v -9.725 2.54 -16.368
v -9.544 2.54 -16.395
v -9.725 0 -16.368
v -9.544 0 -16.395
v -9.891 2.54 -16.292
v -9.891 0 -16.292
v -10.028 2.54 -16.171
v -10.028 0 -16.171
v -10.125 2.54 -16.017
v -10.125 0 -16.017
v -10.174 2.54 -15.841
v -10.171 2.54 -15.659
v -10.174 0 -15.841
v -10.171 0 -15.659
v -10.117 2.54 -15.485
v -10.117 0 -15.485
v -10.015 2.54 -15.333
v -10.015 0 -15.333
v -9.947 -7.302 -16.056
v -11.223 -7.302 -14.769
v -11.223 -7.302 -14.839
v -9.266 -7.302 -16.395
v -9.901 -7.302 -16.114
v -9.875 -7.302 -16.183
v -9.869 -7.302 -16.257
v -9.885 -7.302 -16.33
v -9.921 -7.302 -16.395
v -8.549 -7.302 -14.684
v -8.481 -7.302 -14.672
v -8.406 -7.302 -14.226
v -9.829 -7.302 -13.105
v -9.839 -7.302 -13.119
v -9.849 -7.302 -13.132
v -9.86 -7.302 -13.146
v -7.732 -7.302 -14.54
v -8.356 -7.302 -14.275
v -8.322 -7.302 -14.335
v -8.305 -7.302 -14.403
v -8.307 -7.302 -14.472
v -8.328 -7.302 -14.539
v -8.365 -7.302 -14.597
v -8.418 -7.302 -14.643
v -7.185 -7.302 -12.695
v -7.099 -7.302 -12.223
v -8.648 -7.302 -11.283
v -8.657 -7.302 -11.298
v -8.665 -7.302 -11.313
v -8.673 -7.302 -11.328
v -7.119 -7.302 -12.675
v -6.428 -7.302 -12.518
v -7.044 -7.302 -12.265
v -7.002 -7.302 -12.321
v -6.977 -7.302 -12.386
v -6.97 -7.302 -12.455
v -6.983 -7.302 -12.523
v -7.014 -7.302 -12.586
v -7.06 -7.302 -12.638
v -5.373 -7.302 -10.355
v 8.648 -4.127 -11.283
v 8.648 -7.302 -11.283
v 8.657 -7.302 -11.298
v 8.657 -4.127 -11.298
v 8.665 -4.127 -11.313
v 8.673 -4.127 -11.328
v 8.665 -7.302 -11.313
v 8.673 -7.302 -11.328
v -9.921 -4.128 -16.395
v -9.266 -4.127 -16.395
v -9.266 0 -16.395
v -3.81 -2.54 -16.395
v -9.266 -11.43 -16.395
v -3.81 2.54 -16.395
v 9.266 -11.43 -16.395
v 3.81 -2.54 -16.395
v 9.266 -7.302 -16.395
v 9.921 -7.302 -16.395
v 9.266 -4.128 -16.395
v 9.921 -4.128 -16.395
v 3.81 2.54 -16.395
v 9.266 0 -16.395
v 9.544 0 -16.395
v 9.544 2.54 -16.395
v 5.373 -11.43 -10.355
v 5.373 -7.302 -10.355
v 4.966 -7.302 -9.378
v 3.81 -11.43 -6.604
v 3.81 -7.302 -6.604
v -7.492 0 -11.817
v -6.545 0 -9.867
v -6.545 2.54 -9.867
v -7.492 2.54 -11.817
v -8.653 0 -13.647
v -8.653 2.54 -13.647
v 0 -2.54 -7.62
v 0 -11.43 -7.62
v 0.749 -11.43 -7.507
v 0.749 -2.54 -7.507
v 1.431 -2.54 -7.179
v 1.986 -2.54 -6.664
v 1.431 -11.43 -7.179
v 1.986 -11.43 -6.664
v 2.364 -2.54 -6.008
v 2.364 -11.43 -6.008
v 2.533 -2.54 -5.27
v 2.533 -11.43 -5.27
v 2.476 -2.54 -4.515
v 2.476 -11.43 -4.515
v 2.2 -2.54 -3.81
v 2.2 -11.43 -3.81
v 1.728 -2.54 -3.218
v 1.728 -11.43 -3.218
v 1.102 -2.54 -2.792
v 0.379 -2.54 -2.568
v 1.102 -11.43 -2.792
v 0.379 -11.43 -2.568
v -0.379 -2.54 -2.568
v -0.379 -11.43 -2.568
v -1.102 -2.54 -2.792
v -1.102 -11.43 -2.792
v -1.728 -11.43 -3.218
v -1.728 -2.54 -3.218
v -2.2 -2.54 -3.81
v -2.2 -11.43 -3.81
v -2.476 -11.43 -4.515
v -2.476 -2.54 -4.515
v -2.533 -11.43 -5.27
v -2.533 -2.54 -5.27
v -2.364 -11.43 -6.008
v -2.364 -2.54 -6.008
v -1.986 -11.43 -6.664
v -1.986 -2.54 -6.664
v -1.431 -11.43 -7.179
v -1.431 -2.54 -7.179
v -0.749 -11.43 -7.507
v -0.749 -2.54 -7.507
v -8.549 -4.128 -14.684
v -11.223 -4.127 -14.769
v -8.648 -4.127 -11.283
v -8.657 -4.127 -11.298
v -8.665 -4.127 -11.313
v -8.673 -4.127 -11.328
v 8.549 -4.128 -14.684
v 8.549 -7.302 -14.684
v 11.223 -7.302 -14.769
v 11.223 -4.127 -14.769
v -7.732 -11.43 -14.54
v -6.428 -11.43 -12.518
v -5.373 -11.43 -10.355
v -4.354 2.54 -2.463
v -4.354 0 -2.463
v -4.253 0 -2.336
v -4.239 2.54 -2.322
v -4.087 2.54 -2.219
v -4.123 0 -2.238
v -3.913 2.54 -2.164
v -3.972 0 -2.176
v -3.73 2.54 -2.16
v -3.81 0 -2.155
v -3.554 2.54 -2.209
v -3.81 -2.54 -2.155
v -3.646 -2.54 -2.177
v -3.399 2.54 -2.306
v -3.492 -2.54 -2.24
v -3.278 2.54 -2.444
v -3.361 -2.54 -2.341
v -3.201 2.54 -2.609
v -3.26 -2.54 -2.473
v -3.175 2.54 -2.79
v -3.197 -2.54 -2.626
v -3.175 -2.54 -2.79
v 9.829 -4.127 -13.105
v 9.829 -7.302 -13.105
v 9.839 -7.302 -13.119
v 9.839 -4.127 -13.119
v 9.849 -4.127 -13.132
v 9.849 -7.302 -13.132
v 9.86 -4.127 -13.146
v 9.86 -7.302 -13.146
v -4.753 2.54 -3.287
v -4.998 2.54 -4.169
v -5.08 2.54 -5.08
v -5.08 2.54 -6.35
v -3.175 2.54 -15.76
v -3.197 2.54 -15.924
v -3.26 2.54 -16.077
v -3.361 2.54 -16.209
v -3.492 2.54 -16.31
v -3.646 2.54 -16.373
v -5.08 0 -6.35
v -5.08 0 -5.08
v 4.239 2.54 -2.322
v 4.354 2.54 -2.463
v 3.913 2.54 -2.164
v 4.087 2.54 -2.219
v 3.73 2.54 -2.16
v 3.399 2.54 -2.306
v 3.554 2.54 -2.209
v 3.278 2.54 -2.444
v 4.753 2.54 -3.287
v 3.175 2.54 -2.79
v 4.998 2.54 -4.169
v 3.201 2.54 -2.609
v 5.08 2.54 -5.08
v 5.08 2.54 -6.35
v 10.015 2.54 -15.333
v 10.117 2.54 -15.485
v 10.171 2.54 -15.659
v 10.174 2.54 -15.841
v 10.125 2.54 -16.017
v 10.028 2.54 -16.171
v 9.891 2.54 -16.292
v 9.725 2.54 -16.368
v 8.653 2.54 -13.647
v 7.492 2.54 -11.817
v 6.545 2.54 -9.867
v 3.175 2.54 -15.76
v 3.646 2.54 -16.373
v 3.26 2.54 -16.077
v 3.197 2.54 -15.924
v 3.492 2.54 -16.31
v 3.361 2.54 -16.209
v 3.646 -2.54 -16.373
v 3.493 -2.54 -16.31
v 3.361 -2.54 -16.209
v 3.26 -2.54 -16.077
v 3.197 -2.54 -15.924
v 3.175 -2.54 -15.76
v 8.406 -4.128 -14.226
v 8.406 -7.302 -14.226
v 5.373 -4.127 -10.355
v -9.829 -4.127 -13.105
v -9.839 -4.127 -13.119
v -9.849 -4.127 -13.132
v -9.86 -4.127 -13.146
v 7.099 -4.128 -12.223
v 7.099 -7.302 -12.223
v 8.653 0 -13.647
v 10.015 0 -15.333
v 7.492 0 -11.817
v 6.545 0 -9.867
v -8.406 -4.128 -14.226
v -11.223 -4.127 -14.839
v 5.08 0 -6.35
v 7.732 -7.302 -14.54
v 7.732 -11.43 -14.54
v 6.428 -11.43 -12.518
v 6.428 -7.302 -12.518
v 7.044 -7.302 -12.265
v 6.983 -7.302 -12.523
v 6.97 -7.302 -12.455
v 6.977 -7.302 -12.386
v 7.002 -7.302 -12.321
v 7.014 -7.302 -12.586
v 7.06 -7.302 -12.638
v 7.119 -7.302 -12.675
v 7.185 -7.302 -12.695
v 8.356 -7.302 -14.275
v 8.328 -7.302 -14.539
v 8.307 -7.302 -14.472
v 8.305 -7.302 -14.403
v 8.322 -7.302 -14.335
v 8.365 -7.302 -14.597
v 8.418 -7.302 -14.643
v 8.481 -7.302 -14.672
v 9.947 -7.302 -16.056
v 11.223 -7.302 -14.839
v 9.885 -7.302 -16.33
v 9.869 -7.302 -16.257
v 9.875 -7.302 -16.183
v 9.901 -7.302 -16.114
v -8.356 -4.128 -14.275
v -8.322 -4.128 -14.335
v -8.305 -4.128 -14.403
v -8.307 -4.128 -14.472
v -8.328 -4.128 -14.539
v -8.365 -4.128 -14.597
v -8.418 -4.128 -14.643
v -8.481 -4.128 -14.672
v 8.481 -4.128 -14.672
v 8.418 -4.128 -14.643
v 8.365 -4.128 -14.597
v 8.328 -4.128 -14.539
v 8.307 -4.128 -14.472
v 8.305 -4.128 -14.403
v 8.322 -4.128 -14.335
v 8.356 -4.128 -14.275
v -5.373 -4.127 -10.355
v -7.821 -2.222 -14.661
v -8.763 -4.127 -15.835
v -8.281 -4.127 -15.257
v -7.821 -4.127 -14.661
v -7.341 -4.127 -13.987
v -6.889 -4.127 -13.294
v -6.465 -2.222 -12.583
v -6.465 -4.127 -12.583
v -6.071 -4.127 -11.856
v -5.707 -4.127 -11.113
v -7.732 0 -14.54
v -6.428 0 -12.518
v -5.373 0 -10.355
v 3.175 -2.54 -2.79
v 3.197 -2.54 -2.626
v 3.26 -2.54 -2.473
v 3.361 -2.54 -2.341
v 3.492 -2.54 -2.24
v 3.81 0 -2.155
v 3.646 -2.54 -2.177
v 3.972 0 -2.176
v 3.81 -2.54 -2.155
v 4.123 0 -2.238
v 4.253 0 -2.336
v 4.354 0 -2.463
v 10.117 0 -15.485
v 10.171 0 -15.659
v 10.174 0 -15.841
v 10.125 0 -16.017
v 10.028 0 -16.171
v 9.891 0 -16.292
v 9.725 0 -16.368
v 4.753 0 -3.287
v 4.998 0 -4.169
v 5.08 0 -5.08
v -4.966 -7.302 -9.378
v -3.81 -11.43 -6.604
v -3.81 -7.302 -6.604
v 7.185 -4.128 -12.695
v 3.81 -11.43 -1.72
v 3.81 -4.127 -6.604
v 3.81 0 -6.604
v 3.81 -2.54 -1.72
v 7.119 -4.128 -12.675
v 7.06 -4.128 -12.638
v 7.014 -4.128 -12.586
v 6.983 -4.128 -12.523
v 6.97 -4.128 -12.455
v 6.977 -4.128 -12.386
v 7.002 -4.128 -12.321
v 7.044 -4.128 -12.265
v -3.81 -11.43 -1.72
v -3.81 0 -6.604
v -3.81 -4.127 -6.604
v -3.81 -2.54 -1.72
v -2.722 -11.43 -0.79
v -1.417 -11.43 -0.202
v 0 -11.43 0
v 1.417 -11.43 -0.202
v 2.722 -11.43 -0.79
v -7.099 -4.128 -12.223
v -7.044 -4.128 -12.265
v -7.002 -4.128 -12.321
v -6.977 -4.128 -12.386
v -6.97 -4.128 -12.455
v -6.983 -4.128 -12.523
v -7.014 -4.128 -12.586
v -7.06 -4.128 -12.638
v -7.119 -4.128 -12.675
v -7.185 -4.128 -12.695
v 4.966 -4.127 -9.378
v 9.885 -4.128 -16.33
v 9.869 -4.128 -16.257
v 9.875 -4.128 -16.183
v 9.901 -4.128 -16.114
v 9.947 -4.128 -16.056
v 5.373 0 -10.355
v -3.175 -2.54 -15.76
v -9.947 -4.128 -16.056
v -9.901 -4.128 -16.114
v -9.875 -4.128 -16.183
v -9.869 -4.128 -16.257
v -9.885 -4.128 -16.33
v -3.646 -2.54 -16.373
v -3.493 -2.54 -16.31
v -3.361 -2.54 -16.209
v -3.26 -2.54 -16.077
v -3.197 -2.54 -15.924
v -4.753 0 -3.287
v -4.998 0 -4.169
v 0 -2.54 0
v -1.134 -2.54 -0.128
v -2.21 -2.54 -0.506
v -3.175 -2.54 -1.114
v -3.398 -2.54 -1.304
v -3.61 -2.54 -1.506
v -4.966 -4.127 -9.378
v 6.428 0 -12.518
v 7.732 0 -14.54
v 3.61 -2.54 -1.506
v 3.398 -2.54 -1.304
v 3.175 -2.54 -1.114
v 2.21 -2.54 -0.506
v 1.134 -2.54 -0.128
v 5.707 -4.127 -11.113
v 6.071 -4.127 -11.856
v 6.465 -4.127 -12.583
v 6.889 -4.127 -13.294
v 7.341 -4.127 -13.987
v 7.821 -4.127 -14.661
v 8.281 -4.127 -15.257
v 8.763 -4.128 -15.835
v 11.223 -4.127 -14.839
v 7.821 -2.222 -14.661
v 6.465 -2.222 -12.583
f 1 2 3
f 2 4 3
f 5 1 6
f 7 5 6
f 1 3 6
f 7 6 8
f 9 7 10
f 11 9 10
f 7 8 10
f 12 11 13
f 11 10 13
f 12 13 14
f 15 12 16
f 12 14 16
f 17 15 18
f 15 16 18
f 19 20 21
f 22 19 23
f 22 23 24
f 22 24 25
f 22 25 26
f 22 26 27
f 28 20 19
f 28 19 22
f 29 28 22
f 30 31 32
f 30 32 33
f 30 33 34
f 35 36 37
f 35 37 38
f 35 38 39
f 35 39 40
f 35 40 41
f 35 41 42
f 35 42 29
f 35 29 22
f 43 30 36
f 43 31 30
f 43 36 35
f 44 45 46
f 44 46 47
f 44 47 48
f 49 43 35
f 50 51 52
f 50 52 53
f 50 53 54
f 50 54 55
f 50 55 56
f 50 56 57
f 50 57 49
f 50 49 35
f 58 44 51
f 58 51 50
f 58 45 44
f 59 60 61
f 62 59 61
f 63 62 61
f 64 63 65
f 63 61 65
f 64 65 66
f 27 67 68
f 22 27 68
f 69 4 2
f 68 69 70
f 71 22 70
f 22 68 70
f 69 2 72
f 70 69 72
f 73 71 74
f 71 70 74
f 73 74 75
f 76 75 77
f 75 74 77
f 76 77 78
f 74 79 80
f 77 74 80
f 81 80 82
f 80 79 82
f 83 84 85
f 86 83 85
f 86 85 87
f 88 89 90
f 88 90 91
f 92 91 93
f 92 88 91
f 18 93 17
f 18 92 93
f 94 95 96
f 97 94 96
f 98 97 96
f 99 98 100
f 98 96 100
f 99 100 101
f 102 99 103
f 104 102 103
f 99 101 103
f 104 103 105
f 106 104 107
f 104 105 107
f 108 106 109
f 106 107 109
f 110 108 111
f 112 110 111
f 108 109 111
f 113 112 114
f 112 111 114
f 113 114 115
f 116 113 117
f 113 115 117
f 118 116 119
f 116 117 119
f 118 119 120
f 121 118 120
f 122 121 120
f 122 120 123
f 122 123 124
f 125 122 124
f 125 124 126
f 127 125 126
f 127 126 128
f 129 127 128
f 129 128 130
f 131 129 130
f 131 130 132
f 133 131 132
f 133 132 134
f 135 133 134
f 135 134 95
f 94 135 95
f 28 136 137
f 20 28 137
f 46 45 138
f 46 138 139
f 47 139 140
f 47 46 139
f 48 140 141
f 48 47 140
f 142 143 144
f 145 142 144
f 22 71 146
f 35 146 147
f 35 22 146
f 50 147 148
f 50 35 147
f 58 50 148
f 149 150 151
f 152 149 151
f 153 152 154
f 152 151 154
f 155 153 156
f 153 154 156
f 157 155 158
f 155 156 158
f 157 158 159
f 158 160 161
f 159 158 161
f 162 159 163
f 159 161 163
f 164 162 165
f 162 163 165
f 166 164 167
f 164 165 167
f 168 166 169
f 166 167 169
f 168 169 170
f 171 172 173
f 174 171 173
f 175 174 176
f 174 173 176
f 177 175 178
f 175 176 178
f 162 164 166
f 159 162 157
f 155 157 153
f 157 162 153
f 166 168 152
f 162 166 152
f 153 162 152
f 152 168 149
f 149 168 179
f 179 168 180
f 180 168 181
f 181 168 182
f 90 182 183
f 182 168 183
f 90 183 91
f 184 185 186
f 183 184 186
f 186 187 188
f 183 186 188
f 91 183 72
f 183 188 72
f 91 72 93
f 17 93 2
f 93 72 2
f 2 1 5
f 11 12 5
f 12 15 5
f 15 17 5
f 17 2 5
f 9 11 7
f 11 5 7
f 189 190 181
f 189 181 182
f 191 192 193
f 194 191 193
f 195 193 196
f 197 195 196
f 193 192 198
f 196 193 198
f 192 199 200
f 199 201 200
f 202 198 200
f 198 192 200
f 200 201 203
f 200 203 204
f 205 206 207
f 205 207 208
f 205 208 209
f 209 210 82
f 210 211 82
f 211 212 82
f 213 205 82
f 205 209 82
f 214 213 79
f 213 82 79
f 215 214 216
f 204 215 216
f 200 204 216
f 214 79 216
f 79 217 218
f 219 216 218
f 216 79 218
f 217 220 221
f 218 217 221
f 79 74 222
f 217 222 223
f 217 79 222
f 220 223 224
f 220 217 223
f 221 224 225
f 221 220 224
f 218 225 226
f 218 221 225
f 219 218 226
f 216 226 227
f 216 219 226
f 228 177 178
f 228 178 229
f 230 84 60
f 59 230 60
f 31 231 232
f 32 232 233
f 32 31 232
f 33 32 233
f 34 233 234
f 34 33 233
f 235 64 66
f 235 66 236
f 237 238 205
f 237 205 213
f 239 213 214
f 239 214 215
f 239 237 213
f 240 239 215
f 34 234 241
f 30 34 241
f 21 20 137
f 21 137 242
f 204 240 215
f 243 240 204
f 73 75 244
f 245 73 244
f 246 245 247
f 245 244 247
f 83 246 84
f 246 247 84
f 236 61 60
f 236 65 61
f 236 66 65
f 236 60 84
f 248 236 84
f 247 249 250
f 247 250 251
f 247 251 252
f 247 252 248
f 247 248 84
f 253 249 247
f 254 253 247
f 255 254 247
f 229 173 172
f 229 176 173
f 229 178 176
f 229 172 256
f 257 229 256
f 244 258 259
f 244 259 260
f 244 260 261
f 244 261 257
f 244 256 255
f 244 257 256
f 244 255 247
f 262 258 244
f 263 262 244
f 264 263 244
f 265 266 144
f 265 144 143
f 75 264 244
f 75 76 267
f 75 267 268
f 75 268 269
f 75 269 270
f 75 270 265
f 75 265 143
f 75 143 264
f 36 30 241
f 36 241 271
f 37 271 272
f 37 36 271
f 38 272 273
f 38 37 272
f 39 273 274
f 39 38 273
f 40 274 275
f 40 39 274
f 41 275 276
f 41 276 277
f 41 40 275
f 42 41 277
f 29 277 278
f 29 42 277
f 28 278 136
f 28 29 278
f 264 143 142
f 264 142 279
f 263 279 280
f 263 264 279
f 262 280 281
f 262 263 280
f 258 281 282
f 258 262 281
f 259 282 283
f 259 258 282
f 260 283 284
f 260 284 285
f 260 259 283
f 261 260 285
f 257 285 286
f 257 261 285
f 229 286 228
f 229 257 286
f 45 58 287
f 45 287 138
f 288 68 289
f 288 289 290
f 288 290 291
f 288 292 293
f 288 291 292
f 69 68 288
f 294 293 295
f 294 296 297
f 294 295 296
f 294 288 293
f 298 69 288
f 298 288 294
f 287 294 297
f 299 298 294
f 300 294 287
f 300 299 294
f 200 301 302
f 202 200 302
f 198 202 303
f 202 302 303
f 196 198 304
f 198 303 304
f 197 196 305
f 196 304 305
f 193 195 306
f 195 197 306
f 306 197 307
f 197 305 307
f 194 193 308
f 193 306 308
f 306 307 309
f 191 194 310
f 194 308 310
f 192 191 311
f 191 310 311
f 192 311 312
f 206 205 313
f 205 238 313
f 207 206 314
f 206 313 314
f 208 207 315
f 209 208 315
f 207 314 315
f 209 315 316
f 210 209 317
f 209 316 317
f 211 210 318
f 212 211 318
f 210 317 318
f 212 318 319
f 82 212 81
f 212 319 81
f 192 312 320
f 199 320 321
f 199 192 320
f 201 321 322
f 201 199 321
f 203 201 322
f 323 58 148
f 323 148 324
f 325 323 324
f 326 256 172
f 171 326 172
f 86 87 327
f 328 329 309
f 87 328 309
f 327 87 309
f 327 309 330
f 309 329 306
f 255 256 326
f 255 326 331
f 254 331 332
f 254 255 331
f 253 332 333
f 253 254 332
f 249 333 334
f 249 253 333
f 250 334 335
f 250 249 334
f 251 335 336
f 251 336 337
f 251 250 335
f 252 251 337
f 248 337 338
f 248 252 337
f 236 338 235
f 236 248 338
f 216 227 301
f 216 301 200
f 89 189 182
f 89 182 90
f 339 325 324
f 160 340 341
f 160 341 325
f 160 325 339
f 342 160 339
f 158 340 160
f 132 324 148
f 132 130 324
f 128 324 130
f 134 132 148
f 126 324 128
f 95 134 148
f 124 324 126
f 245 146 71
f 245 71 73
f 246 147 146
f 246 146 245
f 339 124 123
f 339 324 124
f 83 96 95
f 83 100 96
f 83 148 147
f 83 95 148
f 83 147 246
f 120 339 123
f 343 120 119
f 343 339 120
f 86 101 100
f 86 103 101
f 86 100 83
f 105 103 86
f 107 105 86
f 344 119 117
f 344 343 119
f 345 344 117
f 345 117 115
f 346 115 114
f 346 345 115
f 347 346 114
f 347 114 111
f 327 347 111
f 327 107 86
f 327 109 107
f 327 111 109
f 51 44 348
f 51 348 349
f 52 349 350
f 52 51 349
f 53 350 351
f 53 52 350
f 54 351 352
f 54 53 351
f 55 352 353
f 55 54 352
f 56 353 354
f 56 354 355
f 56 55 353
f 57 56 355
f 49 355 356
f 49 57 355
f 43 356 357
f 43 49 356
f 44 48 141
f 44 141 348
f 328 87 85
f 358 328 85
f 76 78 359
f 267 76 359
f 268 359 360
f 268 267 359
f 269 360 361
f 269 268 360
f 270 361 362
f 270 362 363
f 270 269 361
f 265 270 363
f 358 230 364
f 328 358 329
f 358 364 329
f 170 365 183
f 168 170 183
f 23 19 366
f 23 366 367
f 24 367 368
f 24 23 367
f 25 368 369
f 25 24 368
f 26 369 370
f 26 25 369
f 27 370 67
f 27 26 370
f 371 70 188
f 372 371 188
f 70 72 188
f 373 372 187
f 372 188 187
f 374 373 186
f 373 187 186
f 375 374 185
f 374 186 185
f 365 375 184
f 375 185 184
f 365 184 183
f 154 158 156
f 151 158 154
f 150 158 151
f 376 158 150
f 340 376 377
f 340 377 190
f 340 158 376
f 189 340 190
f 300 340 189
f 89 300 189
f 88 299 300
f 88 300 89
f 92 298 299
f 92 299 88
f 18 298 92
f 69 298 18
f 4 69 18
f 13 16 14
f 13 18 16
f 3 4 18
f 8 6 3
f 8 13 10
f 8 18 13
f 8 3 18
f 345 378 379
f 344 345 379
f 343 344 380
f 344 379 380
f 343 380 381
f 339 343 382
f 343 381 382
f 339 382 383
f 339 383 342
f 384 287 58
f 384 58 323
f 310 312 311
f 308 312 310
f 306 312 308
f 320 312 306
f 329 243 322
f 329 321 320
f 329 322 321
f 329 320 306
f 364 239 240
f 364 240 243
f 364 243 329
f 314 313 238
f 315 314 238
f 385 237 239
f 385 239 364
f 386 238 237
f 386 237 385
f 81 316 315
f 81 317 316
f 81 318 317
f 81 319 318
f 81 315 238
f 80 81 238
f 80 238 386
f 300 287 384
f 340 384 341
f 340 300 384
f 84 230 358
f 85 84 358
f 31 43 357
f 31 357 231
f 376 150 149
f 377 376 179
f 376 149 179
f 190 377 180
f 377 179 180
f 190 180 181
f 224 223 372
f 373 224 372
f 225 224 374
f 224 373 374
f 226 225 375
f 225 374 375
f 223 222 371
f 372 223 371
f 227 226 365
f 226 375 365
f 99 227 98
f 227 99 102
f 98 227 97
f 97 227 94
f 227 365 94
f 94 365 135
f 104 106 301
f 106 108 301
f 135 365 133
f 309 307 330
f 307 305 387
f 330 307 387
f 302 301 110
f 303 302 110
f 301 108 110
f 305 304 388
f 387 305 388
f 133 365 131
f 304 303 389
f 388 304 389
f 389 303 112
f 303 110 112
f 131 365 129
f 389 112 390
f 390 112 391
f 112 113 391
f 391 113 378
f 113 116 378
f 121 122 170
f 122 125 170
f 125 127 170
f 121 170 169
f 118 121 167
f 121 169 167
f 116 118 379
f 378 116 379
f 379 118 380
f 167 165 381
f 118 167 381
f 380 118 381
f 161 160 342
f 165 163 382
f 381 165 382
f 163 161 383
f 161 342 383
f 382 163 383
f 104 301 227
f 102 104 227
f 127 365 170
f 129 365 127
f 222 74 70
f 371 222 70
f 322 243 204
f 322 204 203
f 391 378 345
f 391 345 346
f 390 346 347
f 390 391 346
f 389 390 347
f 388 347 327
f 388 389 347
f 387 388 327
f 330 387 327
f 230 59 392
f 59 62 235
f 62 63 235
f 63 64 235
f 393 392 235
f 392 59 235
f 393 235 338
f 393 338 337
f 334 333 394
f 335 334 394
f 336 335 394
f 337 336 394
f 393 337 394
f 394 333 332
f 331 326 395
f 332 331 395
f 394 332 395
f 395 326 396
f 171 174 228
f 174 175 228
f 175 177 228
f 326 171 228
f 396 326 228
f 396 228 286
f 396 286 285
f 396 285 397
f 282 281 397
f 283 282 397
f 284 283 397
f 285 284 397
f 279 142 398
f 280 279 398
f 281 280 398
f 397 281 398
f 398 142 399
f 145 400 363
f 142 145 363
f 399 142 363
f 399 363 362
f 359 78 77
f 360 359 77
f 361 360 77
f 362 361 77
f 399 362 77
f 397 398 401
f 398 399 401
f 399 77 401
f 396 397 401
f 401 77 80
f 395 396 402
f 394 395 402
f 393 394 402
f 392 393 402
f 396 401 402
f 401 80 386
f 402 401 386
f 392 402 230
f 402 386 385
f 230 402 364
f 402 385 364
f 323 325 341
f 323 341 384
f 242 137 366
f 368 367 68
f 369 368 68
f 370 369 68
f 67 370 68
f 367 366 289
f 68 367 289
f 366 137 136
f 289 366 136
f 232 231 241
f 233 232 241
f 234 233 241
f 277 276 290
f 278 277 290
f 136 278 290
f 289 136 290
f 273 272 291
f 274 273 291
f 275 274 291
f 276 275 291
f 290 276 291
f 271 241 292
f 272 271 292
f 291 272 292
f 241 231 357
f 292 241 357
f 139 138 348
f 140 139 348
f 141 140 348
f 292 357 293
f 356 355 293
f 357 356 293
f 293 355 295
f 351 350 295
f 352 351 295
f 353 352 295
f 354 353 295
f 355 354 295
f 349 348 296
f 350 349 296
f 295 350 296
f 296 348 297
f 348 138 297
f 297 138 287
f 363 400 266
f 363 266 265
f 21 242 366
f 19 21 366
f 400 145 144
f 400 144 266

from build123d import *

# Parameters (mm, degrees)
BOSS_EXTRUDE1_DEPTH  = 2.54
BOSS_EXTRUDE2_DEPTH  = 11.43
BOSS_EXTRUDE3_DEPTH  = 1.5875
CUT_EXTRUDE1_DEPTH   = 5.08
CUT_EXTRUDE2_DEPTH   = 5.08
CIRPATTERN1_COUNT    = 10
CIRPATTERN1_ANGLE    = 63
FILLET1_R            = 0.254
MIRROR1_COPY_1_DEPTH = 5.08
MIRROR1_COPY_2_DEPTH = 5.08
MIRROR1_COPY_3_DEPTH = 5.08
MIRROR1_COPY_4_DEPTH = 5.08
MIRROR1_COPY_5_DEPTH = 5.08
MIRROR1_COPY_6_DEPTH = 5.08
MIRROR1_COPY_7_DEPTH = 5.08
MIRROR1_COPY_8_DEPTH = 5.08
MIRROR1_COPY_9_DEPTH = 5.08
FILLET1_OF_MIRROR1_R = 0.254
FILLET3_R            = 5.08
SKETCH8_R            = 2.54
CUT_EXTRUDE3_DEPTH   = 37.969969278
SKETCH9_W            = 6.35
SKETCH9_H            = 5.08
CUT_EXTRUDE4_DEPTH   = 37.086876125
FILLET5_R            = 1.27
FILLET6_R            = 0.635
SKETCH10_W           = 12.288229788
SKETCH10_H           = 22.793910423
CUT_EXTRUDE5_DEPTH   = 37.969969278
SKETCH11_W           = 22.446987528
SKETCH11_H           = 9.005342915
CUT_EXTRUDE6_DEPTH   = 32.085168686
FILLET7_R            = 0.635


# Some blends are built 0.0001 mm under size
with BuildPart() as part:
    # Sketch1 → Boss-Extrude1 (new body)
    with BuildSketch(Plane(origin=(0, 0, 0), x_dir=(1, 0, 0), z_dir=(0, 1, 0))):
        with BuildLine():
            Line((-22.86, 25.4), (22.86, 25.4))
            Line((22.86, 25.4), (22.86, 21.547619525))
            ThreePointArc((22.86, 21.547619525), (13.040193974, 18.029309291), (6.545384615, 9.866923077))
            Line((6.545384615, 9.866923077), (5.08, 6.35))
            Line((5.08, 6.35), (5.08, 0))
            Line((5.08, 0), (-5.08, 0))
            Line((-5.08, 0), (-5.08, 6.35))
            Line((-5.08, 6.35), (-6.545384615, 9.866923077))
            ThreePointArc((-6.545384615, 9.866923077), (-13.040193974, 18.029309291), (-22.86, 21.547619525))
            Line((-22.86, 21.547619525), (-22.86, 25.4))
        make_face()
    extrude(amount=BOSS_EXTRUDE1_DEPTH)

    # Sketch3 → Boss-Extrude2 (add)
    with BuildSketch(Plane.XZ):
        with BuildLine():
            Line((-3.81, 0), (0, 0))
            Line((0, 0), (0, -25.4))
            Line((0, -25.4), (-21.59, -25.4))
            Line((-21.59, -25.4), (-22.86, -25.4))
            Line((-22.86, -25.4), (-22.86, -22.70062499))
            Line((-22.86, -22.70062499), (-21.59, -22.70062499))
            ThreePointArc((-21.59, -22.70062499), (-11.821833073, -18.70822275), (-5.373076923, -10.355384615))
            Line((-5.373076923, -10.355384615), (-3.81, -6.604))
            Line((-3.81, -6.604), (-3.81, 0))
        make_face()
    boss_extrude2 = extrude(amount=BOSS_EXTRUDE2_DEPTH)

    # Sketch4 → Boss-Extrude3 (add, symmetric)
    with BuildSketch(Plane(origin=(0, -5.715, 0), x_dir=(-1, 0, 0), z_dir=(0, -1, 0))):
        with BuildLine():
            Line((22.944666667, 20.28044489), (22.944666667, 25.4))
            Line((22.944666667, 25.4), (0, 25.4))
            Line((0, 25.4), (0, 0))
            Line((0, 0), (3.81, 0))
            Line((3.81, 0), (3.81, 6.604))
            Line((3.81, 6.604), (4.966025641, 9.378461538))
            Line((4.966025641, 9.378461538), (7.717692308, 9.378461538))
            ThreePointArc((7.717692308, 9.378461538), (13.779514375, 16.996688671), (22.944666667, 20.28044489))
        make_face()
    boss_extrude3 = extrude(amount=BOSS_EXTRUDE3_DEPTH, both=True)

    # Sketch6 → Cut-Extrude1 (cut)
    with BuildSketch(Plane.XZ.offset(7.3025)):
        Polygon((-7.717692308, -9.378461538), (-5.373076923, -10.355384615), (-8.648388962, -11.283461538), align=None)
    cut_extrude1 = extrude(amount=-CUT_EXTRUDE1_DEPTH, mode=Mode.SUBTRACT)

    # Sketch7 → Cut-Extrude2 (cut)
    with BuildSketch(Plane.XZ.offset(7.3025)):
        Polygon((-7.717692308, -9.378461538), (-5.373076923, -10.355384615), (-4.966025641, -9.378461538), align=None)
    cut_extrude2 = extrude(amount=-CUT_EXTRUDE2_DEPTH, mode=Mode.SUBTRACT)

    # CirPattern1: Cut-Extrude1 ×10 about axis
    cirpattern1_axis = Axis((-24.13, 0, -2.54), (0, 1, 0))
    for i in range(1, CIRPATTERN1_COUNT):
        add(cut_extrude1.rotate(cirpattern1_axis, i * CIRPATTERN1_ANGLE / (CIRPATTERN1_COUNT - 1)), mode=Mode.SUBTRACT)

    # Fillet1
    # the kernel refuses this fillet: 0.254 mm, written as the material it adds along each edge
    with BuildSketch(Plane(origin=(-22.5780938, -7.3025, -22.800651202), x_dir=(-0.07637333661020333, 0, 0.9970792914583196), z_dir=(0, 1, 0))) as fillet1_piece_1_section:
        with BuildLine():
            CenterArc((0.663062221, -0.254), FILLET1_R, 90, 108.665400871)
            Line((0.422421678, -0.335290399), (0.417608867, -0.336916207))
            ThreePointArc((0.417608867, -0.336916207), (0.208052614, -0.171624146), (-0.003158225, -0.003978947))
            Line((-0.003158225, -0.003978947), (0, 0.00508))
            Line((0, 0.00508), (0.663062221, 0.00508))
            Line((0.663062221, 0.00508), (0.663062221, 0))
        make_face()
    fillet1_piece_1 = extrude(amount=5.08, mode=Mode.PRIVATE)
    fillet1_piece_1 = split(fillet1_piece_1, bisect_by=Plane(origin=(-22.705091863, -5.715, -22.70062499), z_dir=(0, 0, 1)), keep=Keep.TOP, mode=Mode.PRIVATE)
    fillet1_piece_1 = split(fillet1_piece_1, bisect_by=Plane(origin=(-22.705091863, -4.1275, -22.489092759), z_dir=(0, -1, 0)), keep=Keep.TOP, mode=Mode.PRIVATE)
    fillet1_piece_1 = split(fillet1_piece_1, bisect_by=Plane(origin=(-22.944666667, -5.715, -22.489092759), z_dir=(1, 0, 0)), keep=Keep.TOP, mode=Mode.PRIVATE)
    add(fillet1_piece_1)
    with BuildSketch(Plane(origin=(-22.5780938, -8.960155552, -22.800651202), x_dir=(-0.07637333661019842, 0, 0.99707929145832), z_dir=(0, 1, 0))) as fillet1_piece_2_section:
        with BuildLine():
            CenterArc((0.663062221, -0.254), FILLET1_R, 90, 108.665400871)
            Line((0.422421678, -0.335290399), (0.417608867, -0.336916207))
            ThreePointArc((0.417608867, -0.336916207), (0.208052614, -0.171624146), (-0.003158225, -0.003978947))
            Line((-0.003158225, -0.003978947), (0, 0.00508))
            Line((0, 0.00508), (0.663062221, 0.00508))
            Line((0.663062221, 0.00508), (0.663062221, 0))
        make_face()
    fillet1_piece_2 = extrude(amount=6.737655552, mode=Mode.PRIVATE)
    fillet1_piece_2 = split(fillet1_piece_2, bisect_by=Plane(origin=(-22.610568063, -8.131327776, -22.70062499), z_dir=(0, 0, -1)), keep=Keep.TOP, mode=Mode.PRIVATE)
    fillet1_piece_2 = split(fillet1_piece_2, bisect_by=Plane(origin=(-22.610568063, -7.3025, -22.737867725), z_dir=(0, -1, 0)), keep=Keep.TOP, mode=Mode.PRIVATE)
    add(fillet1_piece_2)
    with BuildSketch(Plane(origin=(-22.5780938, -7.3025, -22.800651202), x_dir=(-0.07637333661020333, 0, 0.9970792914583196), z_dir=(0, 1, 0))) as fillet1_piece_3_section:
        with BuildLine():
            CenterArc((0.663062221, -0.254), FILLET1_R, 90, 108.665400871)
            Line((0.422421678, -0.335290399), (0.417608867, -0.336916207))
            ThreePointArc((0.417608867, -0.336916207), (0.208052614, -0.171624146), (-0.003158225, -0.003978947))
            Line((-0.003158225, -0.003978947), (0, 0.00508))
            Line((0, 0.00508), (0.663062221, 0.00508))
            Line((0.663062221, 0.00508), (0.663062221, 0))
        make_face()
    fillet1_piece_3 = extrude(amount=5.08, mode=Mode.PRIVATE)
    fillet1_piece_3 = split(fillet1_piece_3, bisect_by=Plane(origin=(-22.610568063, -5.715, -22.70062499), z_dir=(0, 0, -1)), keep=Keep.TOP, mode=Mode.PRIVATE)
    fillet1_piece_3 = split(fillet1_piece_3, bisect_by=Plane(origin=(-22.610568063, -4.1275, -22.737867725), z_dir=(0, -1, 0)), keep=Keep.TOP, mode=Mode.PRIVATE)
    add(fillet1_piece_3)
    with BuildSketch(Plane(origin=(-22.5780938, -7.3025, -22.800651202), x_dir=(-0.07637333661020333, 0, 0.9970792914583196), z_dir=(0, 1, 0))) as fillet1_piece_4_section:
        with BuildLine():
            CenterArc((0.663062221, -0.254), FILLET1_R, 90, 108.665400871)
            Line((0.422421678, -0.335290399), (0.417608867, -0.336916207))
            ThreePointArc((0.417608867, -0.336916207), (0.208052614, -0.171624146), (-0.003158225, -0.003978947))
            Line((-0.003158225, -0.003978947), (0, 0.00508))
            Line((0, 0.00508), (0.663062221, 0.00508))
            Line((0.663062221, 0.00508), (0.663062221, 0))
        make_face()
    fillet1_piece_4 = extrude(amount=5.08, mode=Mode.PRIVATE)
    fillet1_piece_4 = split(fillet1_piece_4, bisect_by=Plane(origin=(-22.610568063, -3.175, -22.70062499), z_dir=(0, 0, -1)), keep=Keep.TOP, mode=Mode.PRIVATE)
    fillet1_piece_4 = split(fillet1_piece_4, bisect_by=Plane(origin=(-22.610568063, -4.1275, -22.737867725), z_dir=(0, 1, 0)), keep=Keep.TOP, mode=Mode.PRIVATE)
    add(fillet1_piece_4)
    with BuildSketch(Plane(origin=(-22.5780938, -7.3025, -22.800651202), x_dir=(-0.07637333661020333, 0, 0.9970792914583196), z_dir=(0, 1, 0))) as fillet1_piece_5_section:
        with BuildLine():
            CenterArc((0.663062221, -0.254), FILLET1_R, 90, 108.665400871)
            Line((0.422421678, -0.335290399), (0.417608867, -0.336916207))
            ThreePointArc((0.417608867, -0.336916207), (0.208052614, -0.171624146), (-0.003158225, -0.003978947))
            Line((-0.003158225, -0.003978947), (0, 0.00508))
            Line((0, 0.00508), (0.663062221, 0.00508))
            Line((0.663062221, 0.00508), (0.663062221, 0))
        make_face()
    fillet1_piece_5 = extrude(amount=6.737655552, mode=Mode.PRIVATE)
    fillet1_piece_5 = split(fillet1_piece_5, bisect_by=Plane(origin=(-22.610568063, -1.393672224, -22.70062499), z_dir=(0, 0, -1)), keep=Keep.TOP, mode=Mode.PRIVATE)
    fillet1_piece_5 = split(fillet1_piece_5, bisect_by=Plane(origin=(-22.610568063, -2.2225, -22.737867725), z_dir=(0, 1, 0)), keep=Keep.TOP, mode=Mode.PRIVATE)
    add(fillet1_piece_5)
    with BuildSketch(Plane(origin=(-20.120509215, -7.3025, -22.460501591), x_dir=(-0.7640253133482992, 0, 0.6451862681141263), z_dir=(0, 1, 0)), Plane(origin=(-17.722696902, -7.3025, -21.823383184), x_dir=(-0.836958811389497, 0, 0.5472658842258308), z_dir=(0, 1, 0)), Plane(origin=(-15.42040272, -7.3025, -20.898793948), x_dir=(-0.8974151813055786, 0, 0.4411870265117453), z_dir=(0, 1, 0)), Plane(origin=(-13.247948573, -7.3025, -19.70051738), x_dir=(-0.9444931578692072, 0, 0.3285310864107881), z_dir=(0, 1, 0))) as fillet1_piece_6:
        with BuildLine():
            CenterArc((FILLET1_R * 2.86836666105, FILLET1_R), FILLET1_R, 128.440222299, 141.559777701)
            Line((FILLET1_R * 2.24666887201, FILLET1_R * 1.78325721133), (FILLET1_R * 2.23423491622, FILLET1_R * 1.79892235556))
            Line((FILLET1_R * 2.23423491622, FILLET1_R * 1.79892235556), (-FILLET1_R * 0.0124339557808, FILLET1_R * 0.0156651442266))
            Line((-FILLET1_R * 0.0124339557808, FILLET1_R * 0.0156651442266), (0, -FILLET1_R * 0.02))
            Line((0, -FILLET1_R * 0.02), (FILLET1_R * 2.86836666105, -FILLET1_R * 0.02))
            Line((FILLET1_R * 2.86836666105, -FILLET1_R * 0.02), (FILLET1_R * 2.86836666105, 0))
        make_face()
    extrude(amount=3.175)
    with BuildSketch(Plane(origin=(-11.237720749, -7.3025, -18.246417023), x_dir=(-0.6344625615675041, 0, 0.772953593671186), z_dir=(0, 1, 0)), Plane(origin=(-9.419687114, -7.3025, -16.558170165), x_dir=(-0.723932720787678, 0, 0.6898705790022863), z_dir=(0, 1, 0)), Plane(origin=(-7.820950361, -7.3025, -14.660944678), x_dir=(-0.8026107105625789, 0, 0.5965031829673938), z_dir=(0, 1, 0)), Plane(origin=(-6.465343975, -7.3025, -12.583023823), x_dir=(-0.8693236232823137, 0, 0.49424329838988196), z_dir=(0, 1, 0))) as fillet1_piece_7:
        with BuildLine():
            CenterArc((FILLET1_R * 2.86836666105, -FILLET1_R), FILLET1_R, 90, 141.559777701)
            Line((FILLET1_R * 2.24666887201, -FILLET1_R * 1.78325721133), (FILLET1_R * 2.23423491622, -FILLET1_R * 1.79892235556))
            Line((FILLET1_R * 2.23423491622, -FILLET1_R * 1.79892235556), (-FILLET1_R * 0.0124339557808, -FILLET1_R * 0.0156651442266))
            Line((-FILLET1_R * 0.0124339557808, -FILLET1_R * 0.0156651442266), (0, FILLET1_R * 0.02))
            Line((0, FILLET1_R * 0.02), (FILLET1_R * 2.86836666105, FILLET1_R * 0.02))
            Line((FILLET1_R * 2.86836666105, FILLET1_R * 0.02), (FILLET1_R * 2.86836666105, 0))
        make_face()
    extrude(amount=3.175)

    # Mirror1: Boss-Extrude2, Boss-Extrude3, Cut-Extrude1, Cut-Extrude2 across plane
    add(boss_extrude2.mirror(Plane(origin=(0, -11.43, 0), x_dir=(0, 0, 1), z_dir=(-1, 0, 0))))
    add(boss_extrude3.mirror(Plane(origin=(0, -11.43, 0), x_dir=(0, 0, 1), z_dir=(-1, 0, 0))))
    add(cut_extrude1.mirror(Plane(origin=(0, -11.43, 0), x_dir=(0, 0, 1), z_dir=(-1, 0, 0))), mode=Mode.SUBTRACT)
    add(cut_extrude2.mirror(Plane(origin=(0, -11.43, 0), x_dir=(0, 0, 1), z_dir=(-1, 0, 0))), mode=Mode.SUBTRACT)

    # Mirror1 copy 1 sketch → Mirror1 copy 1 (cut)
    with BuildSketch(Plane(origin=(-0.129686771, -7.3025, -2.959640031), x_dir=(-0.992546151641322, 0, -0.12186934340514778), z_dir=(0, -1, 0))):
        Polygon((-7.717692308, 9.378461538), (-5.373076923, 10.355384615), (-8.648388962, 11.283461538), align=None)
    extrude(amount=-MIRROR1_COPY_1_DEPTH, mode=Mode.SUBTRACT)

    # Mirror1 copy 2 sketch → Mirror1 copy 2 (cut)
    with BuildSketch(Plane(origin=(0.10228251, -7.3025, -5.913024196), x_dir=(-0.9702957262759964, 0, -0.2419218955996683), z_dir=(0, -1, 0))):
        Polygon((-7.717692308, 9.378461538), (-5.373076923, 10.355384615), (-8.648388962, 11.283461538), align=None)
    extrude(amount=-MIRROR1_COPY_2_DEPTH, mode=Mode.SUBTRACT)

    # Mirror1 copy 3 sketch → Mirror1 copy 3 (cut)
    with BuildSketch(Plane(origin=(0.692449717, -7.3025, -8.816124339), x_dir=(-0.9335804264972014, 0, -0.35836794954530116), z_dir=(0, -1, 0))):
        Polygon((-7.717692308, 9.378461538), (-5.373076923, 10.355384615), (-8.648388962, 11.283461538), align=None)
    extrude(amount=-MIRROR1_COPY_3_DEPTH, mode=Mode.SUBTRACT)

    # Mirror1 copy 4 sketch → Mirror1 copy 4 (cut)
    with BuildSketch(Plane(origin=(1.632016815, -7.3025, -11.625661924), x_dir=(-0.8829475928589263, 0, -0.46947156278589186), z_dir=(0, -1, 0))):
        Polygon((-7.717692308, 9.378461538), (-5.373076923, 10.355384615), (-8.648388962, 11.283461538), align=None)
    extrude(amount=-MIRROR1_COPY_4_DEPTH, mode=Mode.SUBTRACT)

    # Mirror1 copy 5 sketch → Mirror1 copy 5 (cut)
    with BuildSketch(Plane(origin=(2.906977023, -7.3025, -14.299753217), x_dir=(-0.8191520442889909, 0, -0.5735764363510474), z_dir=(0, -1, 0))):
        Polygon((-7.717692308, 9.378461538), (-5.373076923, 10.355384615), (-8.648388962, 11.283461538), align=None)
    extrude(amount=-MIRROR1_COPY_5_DEPTH, mode=Mode.SUBTRACT)

    # Mirror1 copy 6 sketch → Mirror1 copy 6 (cut)
    with BuildSketch(Plane(origin=(4.498323621, -7.3025, -16.798533675), x_dir=(-0.7431448254773929, 0, -0.6691306063588596), z_dir=(0, -1, 0))):
        Polygon((-7.717692308, 9.378461538), (-5.373076923, 10.355384615), (-8.648388962, 11.283461538), align=None)
    extrude(amount=-MIRROR1_COPY_6_DEPTH, mode=Mode.SUBTRACT)

    # Mirror1 copy 7 sketch → Mirror1 copy 7 (cut)
    with BuildSketch(Plane(origin=(6.382333297, -7.3025, -19.084752237), x_dir=(-0.6560590289905056, 0, -0.7547095802227735), z_dir=(0, -1, 0))):
        Polygon((-7.717692308, 9.378461538), (-5.373076923, 10.355384615), (-8.648388962, 11.283461538), align=None)
    extrude(amount=-MIRROR1_COPY_7_DEPTH, mode=Mode.SUBTRACT)

    # Mirror1 copy 8 sketch → Mirror1 copy 8 (cut)
    with BuildSketch(Plane(origin=(8.530919805, -7.3025, -21.124326651), x_dir=(-0.5591929034707448, 0, -0.8290375725550431), z_dir=(0, -1, 0))):
        Polygon((-7.717692308, 9.378461538), (-5.373076923, 10.355384615), (-8.648388962, 11.283461538), align=None)
    extrude(amount=-MIRROR1_COPY_8_DEPTH, mode=Mode.SUBTRACT)

    # Mirror1 copy 9 sketch → Mirror1 copy 9 (cut)
    with BuildSketch(Plane(origin=(10.91205267, -7.3025, -22.886851559), x_dir=(-0.4539904997395445, 0, -0.891006524188369), z_dir=(0, -1, 0))):
        Polygon((-7.717692308, 9.378461538), (-5.373076923, 10.355384615), (-8.648388962, 11.283461538), align=None)
    extrude(amount=-MIRROR1_COPY_9_DEPTH, mode=Mode.SUBTRACT)

    # Fillet1 of Mirror1
    # the kernel refuses this fillet: 0.254 mm, written as the material it adds along each edge
    with BuildSketch(Plane(origin=(22.5780938, -7.3025, -22.800651202), x_dir=(0.679701957651323, 0, 0.733488410791172), z_dir=(0, 1, 0))) as fillet1_of_mirror1_piece_1_section:
        with BuildLine():
            CenterArc((0.677259504, -0.213276985), FILLET1_OF_MIRROR1_R, 122.89437683, 108.665400871)
            Line((0.519348266, -0.412224317), (0.516190041, -0.416203263))
            Line((0.516190041, -0.416203263), (-0.003158225, -0.003978947))
            Line((-0.003158225, -0.003978947), (0, 0.00508))
            ThreePointArc((0, 0.00508), (0.269657063, 0.00508), (0.536555217, 0.00426554))
            Line((0.536555217, 0.00426554), (0.539314125, 0))
        make_face()
    fillet1_of_mirror1_piece_1 = extrude(amount=5.08, mode=Mode.PRIVATE)
    fillet1_of_mirror1_piece_1 = split(fillet1_of_mirror1_piece_1, bisect_by=Plane(origin=(22.705091863, -4.1275, -22.489092759), z_dir=(0, -1, 0)), keep=Keep.TOP, mode=Mode.PRIVATE)
    fillet1_of_mirror1_piece_1 = split(fillet1_of_mirror1_piece_1, bisect_by=Plane(origin=(22.944666667, -5.715, -22.489092759), z_dir=(-1, 0, 0)), keep=Keep.TOP, mode=Mode.PRIVATE)
    fillet1_of_mirror1_piece_1 = split(fillet1_of_mirror1_piece_1, bisect_by=Plane(origin=(22.705091863, -5.715, -22.70062499), z_dir=(0, 0, 1)), keep=Keep.TOP, mode=Mode.PRIVATE)
    add(fillet1_of_mirror1_piece_1)
    with BuildSketch(Plane(origin=(22.5780938, -8.960155552, -22.800651202), x_dir=(0.6797019576513229, 0, 0.7334884107911723), z_dir=(0, 1, 0))) as fillet1_of_mirror1_piece_2_section:
        with BuildLine():
            CenterArc((0.677259504, -0.213276985), FILLET1_OF_MIRROR1_R, 122.89437683, 108.665400871)
            Line((0.519348266, -0.412224317), (0.516190041, -0.416203263))
            Line((0.516190041, -0.416203263), (-0.003158225, -0.003978947))
            Line((-0.003158225, -0.003978947), (0, 0.00508))
            ThreePointArc((0, 0.00508), (0.269657063, 0.00508), (0.536555217, 0.00426554))
            Line((0.536555217, 0.00426554), (0.539314125, 0))
        make_face()
    fillet1_of_mirror1_piece_2 = extrude(amount=6.737655552, mode=Mode.PRIVATE)
    fillet1_of_mirror1_piece_2 = split(fillet1_of_mirror1_piece_2, bisect_by=Plane(origin=(22.610568063, -8.131327776, -22.70062499), z_dir=(0, 0, -1)), keep=Keep.TOP, mode=Mode.PRIVATE)
    fillet1_of_mirror1_piece_2 = split(fillet1_of_mirror1_piece_2, bisect_by=Plane(origin=(22.610568063, -7.3025, -22.737867725), z_dir=(0, -1, 0)), keep=Keep.TOP, mode=Mode.PRIVATE)
    add(fillet1_of_mirror1_piece_2)
    with BuildSketch(Plane(origin=(22.5780938, -7.3025, -22.800651202), x_dir=(0.679701957651323, 0, 0.733488410791172), z_dir=(0, 1, 0))) as fillet1_of_mirror1_piece_3_section:
        with BuildLine():
            CenterArc((0.677259504, -0.213276985), FILLET1_OF_MIRROR1_R, 122.89437683, 108.665400871)
            Line((0.519348266, -0.412224317), (0.516190041, -0.416203263))
            Line((0.516190041, -0.416203263), (-0.003158225, -0.003978947))
            Line((-0.003158225, -0.003978947), (0, 0.00508))
            ThreePointArc((0, 0.00508), (0.269657063, 0.00508), (0.536555217, 0.00426554))
            Line((0.536555217, 0.00426554), (0.539314125, 0))
        make_face()
    fillet1_of_mirror1_piece_3 = extrude(amount=5.08, mode=Mode.PRIVATE)
    fillet1_of_mirror1_piece_3 = split(fillet1_of_mirror1_piece_3, bisect_by=Plane(origin=(22.610568063, -4.1275, -22.737867725), z_dir=(0, -1, 0)), keep=Keep.TOP, mode=Mode.PRIVATE)
    fillet1_of_mirror1_piece_3 = split(fillet1_of_mirror1_piece_3, bisect_by=Plane(origin=(22.610568063, -5.715, -22.70062499), z_dir=(0, 0, -1)), keep=Keep.TOP, mode=Mode.PRIVATE)
    add(fillet1_of_mirror1_piece_3)
    with BuildSketch(Plane(origin=(22.5780938, -7.3025, -22.800651202), x_dir=(0.679701957651323, 0, 0.733488410791172), z_dir=(0, 1, 0))) as fillet1_of_mirror1_piece_4_section:
        with BuildLine():
            CenterArc((0.677259504, -0.213276985), FILLET1_OF_MIRROR1_R, 122.89437683, 108.665400871)
            Line((0.519348266, -0.412224317), (0.516190041, -0.416203263))
            Line((0.516190041, -0.416203263), (-0.003158225, -0.003978947))
            Line((-0.003158225, -0.003978947), (0, 0.00508))
            ThreePointArc((0, 0.00508), (0.269657063, 0.00508), (0.536555217, 0.00426554))
            Line((0.536555217, 0.00426554), (0.539314125, 0))
        make_face()
    fillet1_of_mirror1_piece_4 = extrude(amount=5.08, mode=Mode.PRIVATE)
    fillet1_of_mirror1_piece_4 = split(fillet1_of_mirror1_piece_4, bisect_by=Plane(origin=(22.610568063, -4.1275, -22.737867725), z_dir=(0, 1, 0)), keep=Keep.TOP, mode=Mode.PRIVATE)
    fillet1_of_mirror1_piece_4 = split(fillet1_of_mirror1_piece_4, bisect_by=Plane(origin=(22.610568063, -3.175, -22.70062499), z_dir=(0, 0, -1)), keep=Keep.TOP, mode=Mode.PRIVATE)
    add(fillet1_of_mirror1_piece_4)
    with BuildSketch(Plane(origin=(22.5780938, -7.3025, -22.800651202), x_dir=(0.679701957651323, 0, 0.733488410791172), z_dir=(0, 1, 0))) as fillet1_of_mirror1_piece_5_section:
        with BuildLine():
            CenterArc((0.677259504, -0.213276985), FILLET1_OF_MIRROR1_R, 122.89437683, 108.665400871)
            Line((0.519348266, -0.412224317), (0.516190041, -0.416203263))
            Line((0.516190041, -0.416203263), (-0.003158225, -0.003978947))
            Line((-0.003158225, -0.003978947), (0, 0.00508))
            ThreePointArc((0, 0.00508), (0.269657063, 0.00508), (0.536555217, 0.00426554))
            Line((0.536555217, 0.00426554), (0.539314125, 0))
        make_face()
    fillet1_of_mirror1_piece_5 = extrude(amount=6.737655552, mode=Mode.PRIVATE)
    fillet1_of_mirror1_piece_5 = split(fillet1_of_mirror1_piece_5, bisect_by=Plane(origin=(22.610568063, -1.393672224, -22.70062499), z_dir=(0, 0, -1)), keep=Keep.TOP, mode=Mode.PRIVATE)
    fillet1_of_mirror1_piece_5 = split(fillet1_of_mirror1_piece_5, bisect_by=Plane(origin=(22.610568063, -2.2225, -22.737867725), z_dir=(0, 1, 0)), keep=Keep.TOP, mode=Mode.PRIVATE)
    add(fillet1_of_mirror1_piece_5)
    with BuildSketch(Plane(origin=(20.120509215, -7.3025, -22.460501591), x_dir=(0.7640253133482992, 0, 0.6451862681141263), z_dir=(0, 1, 0)), Plane(origin=(17.722696902, -7.3025, -21.823383184), x_dir=(0.836958811389497, 0, 0.5472658842258308), z_dir=(0, 1, 0)), Plane(origin=(15.42040272, -7.3025, -20.898793948), x_dir=(0.8974151813055792, 0, 0.44118702651174435), z_dir=(0, 1, 0)), Plane(origin=(13.247948573, -7.3025, -19.70051738), x_dir=(0.9444931578692072, 0, 0.3285310864107881), z_dir=(0, 1, 0)), Plane(origin=(11.237720749, -7.3025, -18.246417023), x_dir=(0.9774909168837043, 0, 0.21097750451139333), z_dir=(0, 1, 0)), Plane(origin=(9.419687114, -7.3025, -16.558170165), x_dir=(0.995916537765328, 0, 0.0902787339605628), z_dir=(0, 1, 0)), Plane(origin=(7.820950361, -7.3025, -14.660944678), x_dir=(0.9994953369461473, 0, -0.03176588457618356), z_dir=(0, 1, 0)), Plane(origin=(6.465343975, -7.3025, -12.583023823), x_dir=(0.9881739627733617, 0, -0.15333694693970756), z_dir=(0, 1, 0))) as fillet1_of_mirror1_piece_6:
        with BuildLine():
            CenterArc((FILLET1_OF_MIRROR1_R * 2.86836666105, -FILLET1_OF_MIRROR1_R), FILLET1_OF_MIRROR1_R, 90, 141.559777701)
            Line((FILLET1_OF_MIRROR1_R * 2.24666887201, -FILLET1_OF_MIRROR1_R * 1.78325721133), (FILLET1_OF_MIRROR1_R * 2.23423491622, -FILLET1_OF_MIRROR1_R * 1.79892235556))
            Line((FILLET1_OF_MIRROR1_R * 2.23423491622, -FILLET1_OF_MIRROR1_R * 1.79892235556), (-FILLET1_OF_MIRROR1_R * 0.0124339557808, -FILLET1_OF_MIRROR1_R * 0.0156651442266))
            Line((-FILLET1_OF_MIRROR1_R * 0.0124339557808, -FILLET1_OF_MIRROR1_R * 0.0156651442266), (0, FILLET1_OF_MIRROR1_R * 0.02))
            Line((0, FILLET1_OF_MIRROR1_R * 0.02), (FILLET1_OF_MIRROR1_R * 2.86836666105, FILLET1_OF_MIRROR1_R * 0.02))
            Line((FILLET1_OF_MIRROR1_R * 2.86836666105, FILLET1_OF_MIRROR1_R * 0.02), (FILLET1_OF_MIRROR1_R * 2.86836666105, 0))
        make_face()
    extrude(amount=3.175)

    # Fillet3
    fillet3_edges = [part.edges().sort_by_distance(p)[0] for p in [
        (5.08, 1.27, 0),
        (-5.08, 1.27, 0),
    ]]
    fillet(fillet3_edges, radius=FILLET3_R - 0.0001)  # a hair under: the kernel refuses the full size

    # Sketch8 → Cut-Extrude3 (cut, through all)
    with BuildSketch(Plane.XZ.offset(11.43)):
        with Locations(Location((0, -5.08, 0), (0, 0, 270))):
            Circle(SKETCH8_R)
    extrude(amount=-CUT_EXTRUDE3_DEPTH, mode=Mode.SUBTRACT)

    # Sketch9 → Cut-Extrude4 (cut, through all)
    with BuildSketch(Plane.XY.offset(-25.4)):
        Rectangle(SKETCH9_W, SKETCH9_H)
    extrude(amount=CUT_EXTRUDE4_DEPTH, mode=Mode.SUBTRACT)

    # Fillet5
    fillet5_edges = [part.edges().sort_by_distance(p)[0] for p in [
        (-22.86, 1.27, -21.547619525),
        (-22.86, -9.36625, -22.70062499),
        (-22.86, -2.06375, -22.70062499),
        (22.86, 1.27, -21.547619525),
        (22.86, -2.06375, -22.70062499),
        (22.86, -9.36625, -22.70062499),
        (22.86, -0.79375, -25.4),
        (-22.86, -0.79375, -25.4),
    ]]
    fillet(fillet5_edges, radius=FILLET5_R - 0.0001)  # a hair under: the kernel refuses the full size

    # Fillet6
    # the kernel refuses this fillet: 0.635 mm, written as the material it takes off along each edge
    with BuildSketch(Plane(origin=(3.175, -2.54, -1.11437431), x_dir=(0, 0, -1), z_dir=(0, 1, 0))) as fillet6_piece_1:
        with BuildLine():
            CenterArc((1.676028366, -0.635), FILLET6_R, 90, 148.996923357)
            ThreePointArc((1.348949961, -1.179283673), (0.622070551, -0.649585814), (0, 0))
            Line((0, 0), (1.676028366, 0))
        make_face()
    extrude(amount=9.559380523, mode=Mode.SUBTRACT)
    with BuildSketch(Plane(origin=(-3.175, -2.54, -1.11437431), x_dir=(0, 0, -1), z_dir=(0, 1, 0))) as fillet6_piece_2:
        with BuildLine():
            CenterArc((1.676028366, 0.635), FILLET6_R, 121.003076643, 148.996923357)
            ThreePointArc((1.348949961, 1.179283673), (0.622070551, 0.649585814), (0, 0))
            Line((0, 0), (1.676028366, 0))
        make_face()
    extrude(amount=9.559380523, mode=Mode.SUBTRACT)

    # Sketch10 → Cut-Extrude5 (cut, through all)
    with BuildSketch(Plane(origin=(0, 2.54, 0), x_dir=(1, 0, 0), z_dir=(0, 1, 0))):
        with Locations((-17.367608658, 14.003044789)):
            Rectangle(SKETCH10_W, SKETCH10_H)
        with Locations((17.367608658, 14.003044789)):
            Rectangle(SKETCH10_W, SKETCH10_H)
    extrude(amount=-CUT_EXTRUDE5_DEPTH, mode=Mode.SUBTRACT)

    # Sketch11 → Cut-Extrude6 (cut, through all)
    with BuildSketch(Plane(origin=(0, 2.54, 0), x_dir=(1, 0, 0), z_dir=(0, 1, 0))):
        with Locations((0, 20.897328543)):
            Rectangle(SKETCH11_W, SKETCH11_H)
    extrude(amount=-CUT_EXTRUDE6_DEPTH, mode=Mode.SUBTRACT)

    # Fillet7
    fillet7_edges = [part.edges().sort_by_distance(p)[0] for p in [
        (-11.055177743, 1.27, -16.394657085),
        (11.055177743, 1.27, -16.394657085),
        (-3.175, 0, -16.394657085),
        (3.175, 0, -16.394657085),
    ]]
    fillet(fillet7_edges, radius=FILLET7_R)


solid = part.part
